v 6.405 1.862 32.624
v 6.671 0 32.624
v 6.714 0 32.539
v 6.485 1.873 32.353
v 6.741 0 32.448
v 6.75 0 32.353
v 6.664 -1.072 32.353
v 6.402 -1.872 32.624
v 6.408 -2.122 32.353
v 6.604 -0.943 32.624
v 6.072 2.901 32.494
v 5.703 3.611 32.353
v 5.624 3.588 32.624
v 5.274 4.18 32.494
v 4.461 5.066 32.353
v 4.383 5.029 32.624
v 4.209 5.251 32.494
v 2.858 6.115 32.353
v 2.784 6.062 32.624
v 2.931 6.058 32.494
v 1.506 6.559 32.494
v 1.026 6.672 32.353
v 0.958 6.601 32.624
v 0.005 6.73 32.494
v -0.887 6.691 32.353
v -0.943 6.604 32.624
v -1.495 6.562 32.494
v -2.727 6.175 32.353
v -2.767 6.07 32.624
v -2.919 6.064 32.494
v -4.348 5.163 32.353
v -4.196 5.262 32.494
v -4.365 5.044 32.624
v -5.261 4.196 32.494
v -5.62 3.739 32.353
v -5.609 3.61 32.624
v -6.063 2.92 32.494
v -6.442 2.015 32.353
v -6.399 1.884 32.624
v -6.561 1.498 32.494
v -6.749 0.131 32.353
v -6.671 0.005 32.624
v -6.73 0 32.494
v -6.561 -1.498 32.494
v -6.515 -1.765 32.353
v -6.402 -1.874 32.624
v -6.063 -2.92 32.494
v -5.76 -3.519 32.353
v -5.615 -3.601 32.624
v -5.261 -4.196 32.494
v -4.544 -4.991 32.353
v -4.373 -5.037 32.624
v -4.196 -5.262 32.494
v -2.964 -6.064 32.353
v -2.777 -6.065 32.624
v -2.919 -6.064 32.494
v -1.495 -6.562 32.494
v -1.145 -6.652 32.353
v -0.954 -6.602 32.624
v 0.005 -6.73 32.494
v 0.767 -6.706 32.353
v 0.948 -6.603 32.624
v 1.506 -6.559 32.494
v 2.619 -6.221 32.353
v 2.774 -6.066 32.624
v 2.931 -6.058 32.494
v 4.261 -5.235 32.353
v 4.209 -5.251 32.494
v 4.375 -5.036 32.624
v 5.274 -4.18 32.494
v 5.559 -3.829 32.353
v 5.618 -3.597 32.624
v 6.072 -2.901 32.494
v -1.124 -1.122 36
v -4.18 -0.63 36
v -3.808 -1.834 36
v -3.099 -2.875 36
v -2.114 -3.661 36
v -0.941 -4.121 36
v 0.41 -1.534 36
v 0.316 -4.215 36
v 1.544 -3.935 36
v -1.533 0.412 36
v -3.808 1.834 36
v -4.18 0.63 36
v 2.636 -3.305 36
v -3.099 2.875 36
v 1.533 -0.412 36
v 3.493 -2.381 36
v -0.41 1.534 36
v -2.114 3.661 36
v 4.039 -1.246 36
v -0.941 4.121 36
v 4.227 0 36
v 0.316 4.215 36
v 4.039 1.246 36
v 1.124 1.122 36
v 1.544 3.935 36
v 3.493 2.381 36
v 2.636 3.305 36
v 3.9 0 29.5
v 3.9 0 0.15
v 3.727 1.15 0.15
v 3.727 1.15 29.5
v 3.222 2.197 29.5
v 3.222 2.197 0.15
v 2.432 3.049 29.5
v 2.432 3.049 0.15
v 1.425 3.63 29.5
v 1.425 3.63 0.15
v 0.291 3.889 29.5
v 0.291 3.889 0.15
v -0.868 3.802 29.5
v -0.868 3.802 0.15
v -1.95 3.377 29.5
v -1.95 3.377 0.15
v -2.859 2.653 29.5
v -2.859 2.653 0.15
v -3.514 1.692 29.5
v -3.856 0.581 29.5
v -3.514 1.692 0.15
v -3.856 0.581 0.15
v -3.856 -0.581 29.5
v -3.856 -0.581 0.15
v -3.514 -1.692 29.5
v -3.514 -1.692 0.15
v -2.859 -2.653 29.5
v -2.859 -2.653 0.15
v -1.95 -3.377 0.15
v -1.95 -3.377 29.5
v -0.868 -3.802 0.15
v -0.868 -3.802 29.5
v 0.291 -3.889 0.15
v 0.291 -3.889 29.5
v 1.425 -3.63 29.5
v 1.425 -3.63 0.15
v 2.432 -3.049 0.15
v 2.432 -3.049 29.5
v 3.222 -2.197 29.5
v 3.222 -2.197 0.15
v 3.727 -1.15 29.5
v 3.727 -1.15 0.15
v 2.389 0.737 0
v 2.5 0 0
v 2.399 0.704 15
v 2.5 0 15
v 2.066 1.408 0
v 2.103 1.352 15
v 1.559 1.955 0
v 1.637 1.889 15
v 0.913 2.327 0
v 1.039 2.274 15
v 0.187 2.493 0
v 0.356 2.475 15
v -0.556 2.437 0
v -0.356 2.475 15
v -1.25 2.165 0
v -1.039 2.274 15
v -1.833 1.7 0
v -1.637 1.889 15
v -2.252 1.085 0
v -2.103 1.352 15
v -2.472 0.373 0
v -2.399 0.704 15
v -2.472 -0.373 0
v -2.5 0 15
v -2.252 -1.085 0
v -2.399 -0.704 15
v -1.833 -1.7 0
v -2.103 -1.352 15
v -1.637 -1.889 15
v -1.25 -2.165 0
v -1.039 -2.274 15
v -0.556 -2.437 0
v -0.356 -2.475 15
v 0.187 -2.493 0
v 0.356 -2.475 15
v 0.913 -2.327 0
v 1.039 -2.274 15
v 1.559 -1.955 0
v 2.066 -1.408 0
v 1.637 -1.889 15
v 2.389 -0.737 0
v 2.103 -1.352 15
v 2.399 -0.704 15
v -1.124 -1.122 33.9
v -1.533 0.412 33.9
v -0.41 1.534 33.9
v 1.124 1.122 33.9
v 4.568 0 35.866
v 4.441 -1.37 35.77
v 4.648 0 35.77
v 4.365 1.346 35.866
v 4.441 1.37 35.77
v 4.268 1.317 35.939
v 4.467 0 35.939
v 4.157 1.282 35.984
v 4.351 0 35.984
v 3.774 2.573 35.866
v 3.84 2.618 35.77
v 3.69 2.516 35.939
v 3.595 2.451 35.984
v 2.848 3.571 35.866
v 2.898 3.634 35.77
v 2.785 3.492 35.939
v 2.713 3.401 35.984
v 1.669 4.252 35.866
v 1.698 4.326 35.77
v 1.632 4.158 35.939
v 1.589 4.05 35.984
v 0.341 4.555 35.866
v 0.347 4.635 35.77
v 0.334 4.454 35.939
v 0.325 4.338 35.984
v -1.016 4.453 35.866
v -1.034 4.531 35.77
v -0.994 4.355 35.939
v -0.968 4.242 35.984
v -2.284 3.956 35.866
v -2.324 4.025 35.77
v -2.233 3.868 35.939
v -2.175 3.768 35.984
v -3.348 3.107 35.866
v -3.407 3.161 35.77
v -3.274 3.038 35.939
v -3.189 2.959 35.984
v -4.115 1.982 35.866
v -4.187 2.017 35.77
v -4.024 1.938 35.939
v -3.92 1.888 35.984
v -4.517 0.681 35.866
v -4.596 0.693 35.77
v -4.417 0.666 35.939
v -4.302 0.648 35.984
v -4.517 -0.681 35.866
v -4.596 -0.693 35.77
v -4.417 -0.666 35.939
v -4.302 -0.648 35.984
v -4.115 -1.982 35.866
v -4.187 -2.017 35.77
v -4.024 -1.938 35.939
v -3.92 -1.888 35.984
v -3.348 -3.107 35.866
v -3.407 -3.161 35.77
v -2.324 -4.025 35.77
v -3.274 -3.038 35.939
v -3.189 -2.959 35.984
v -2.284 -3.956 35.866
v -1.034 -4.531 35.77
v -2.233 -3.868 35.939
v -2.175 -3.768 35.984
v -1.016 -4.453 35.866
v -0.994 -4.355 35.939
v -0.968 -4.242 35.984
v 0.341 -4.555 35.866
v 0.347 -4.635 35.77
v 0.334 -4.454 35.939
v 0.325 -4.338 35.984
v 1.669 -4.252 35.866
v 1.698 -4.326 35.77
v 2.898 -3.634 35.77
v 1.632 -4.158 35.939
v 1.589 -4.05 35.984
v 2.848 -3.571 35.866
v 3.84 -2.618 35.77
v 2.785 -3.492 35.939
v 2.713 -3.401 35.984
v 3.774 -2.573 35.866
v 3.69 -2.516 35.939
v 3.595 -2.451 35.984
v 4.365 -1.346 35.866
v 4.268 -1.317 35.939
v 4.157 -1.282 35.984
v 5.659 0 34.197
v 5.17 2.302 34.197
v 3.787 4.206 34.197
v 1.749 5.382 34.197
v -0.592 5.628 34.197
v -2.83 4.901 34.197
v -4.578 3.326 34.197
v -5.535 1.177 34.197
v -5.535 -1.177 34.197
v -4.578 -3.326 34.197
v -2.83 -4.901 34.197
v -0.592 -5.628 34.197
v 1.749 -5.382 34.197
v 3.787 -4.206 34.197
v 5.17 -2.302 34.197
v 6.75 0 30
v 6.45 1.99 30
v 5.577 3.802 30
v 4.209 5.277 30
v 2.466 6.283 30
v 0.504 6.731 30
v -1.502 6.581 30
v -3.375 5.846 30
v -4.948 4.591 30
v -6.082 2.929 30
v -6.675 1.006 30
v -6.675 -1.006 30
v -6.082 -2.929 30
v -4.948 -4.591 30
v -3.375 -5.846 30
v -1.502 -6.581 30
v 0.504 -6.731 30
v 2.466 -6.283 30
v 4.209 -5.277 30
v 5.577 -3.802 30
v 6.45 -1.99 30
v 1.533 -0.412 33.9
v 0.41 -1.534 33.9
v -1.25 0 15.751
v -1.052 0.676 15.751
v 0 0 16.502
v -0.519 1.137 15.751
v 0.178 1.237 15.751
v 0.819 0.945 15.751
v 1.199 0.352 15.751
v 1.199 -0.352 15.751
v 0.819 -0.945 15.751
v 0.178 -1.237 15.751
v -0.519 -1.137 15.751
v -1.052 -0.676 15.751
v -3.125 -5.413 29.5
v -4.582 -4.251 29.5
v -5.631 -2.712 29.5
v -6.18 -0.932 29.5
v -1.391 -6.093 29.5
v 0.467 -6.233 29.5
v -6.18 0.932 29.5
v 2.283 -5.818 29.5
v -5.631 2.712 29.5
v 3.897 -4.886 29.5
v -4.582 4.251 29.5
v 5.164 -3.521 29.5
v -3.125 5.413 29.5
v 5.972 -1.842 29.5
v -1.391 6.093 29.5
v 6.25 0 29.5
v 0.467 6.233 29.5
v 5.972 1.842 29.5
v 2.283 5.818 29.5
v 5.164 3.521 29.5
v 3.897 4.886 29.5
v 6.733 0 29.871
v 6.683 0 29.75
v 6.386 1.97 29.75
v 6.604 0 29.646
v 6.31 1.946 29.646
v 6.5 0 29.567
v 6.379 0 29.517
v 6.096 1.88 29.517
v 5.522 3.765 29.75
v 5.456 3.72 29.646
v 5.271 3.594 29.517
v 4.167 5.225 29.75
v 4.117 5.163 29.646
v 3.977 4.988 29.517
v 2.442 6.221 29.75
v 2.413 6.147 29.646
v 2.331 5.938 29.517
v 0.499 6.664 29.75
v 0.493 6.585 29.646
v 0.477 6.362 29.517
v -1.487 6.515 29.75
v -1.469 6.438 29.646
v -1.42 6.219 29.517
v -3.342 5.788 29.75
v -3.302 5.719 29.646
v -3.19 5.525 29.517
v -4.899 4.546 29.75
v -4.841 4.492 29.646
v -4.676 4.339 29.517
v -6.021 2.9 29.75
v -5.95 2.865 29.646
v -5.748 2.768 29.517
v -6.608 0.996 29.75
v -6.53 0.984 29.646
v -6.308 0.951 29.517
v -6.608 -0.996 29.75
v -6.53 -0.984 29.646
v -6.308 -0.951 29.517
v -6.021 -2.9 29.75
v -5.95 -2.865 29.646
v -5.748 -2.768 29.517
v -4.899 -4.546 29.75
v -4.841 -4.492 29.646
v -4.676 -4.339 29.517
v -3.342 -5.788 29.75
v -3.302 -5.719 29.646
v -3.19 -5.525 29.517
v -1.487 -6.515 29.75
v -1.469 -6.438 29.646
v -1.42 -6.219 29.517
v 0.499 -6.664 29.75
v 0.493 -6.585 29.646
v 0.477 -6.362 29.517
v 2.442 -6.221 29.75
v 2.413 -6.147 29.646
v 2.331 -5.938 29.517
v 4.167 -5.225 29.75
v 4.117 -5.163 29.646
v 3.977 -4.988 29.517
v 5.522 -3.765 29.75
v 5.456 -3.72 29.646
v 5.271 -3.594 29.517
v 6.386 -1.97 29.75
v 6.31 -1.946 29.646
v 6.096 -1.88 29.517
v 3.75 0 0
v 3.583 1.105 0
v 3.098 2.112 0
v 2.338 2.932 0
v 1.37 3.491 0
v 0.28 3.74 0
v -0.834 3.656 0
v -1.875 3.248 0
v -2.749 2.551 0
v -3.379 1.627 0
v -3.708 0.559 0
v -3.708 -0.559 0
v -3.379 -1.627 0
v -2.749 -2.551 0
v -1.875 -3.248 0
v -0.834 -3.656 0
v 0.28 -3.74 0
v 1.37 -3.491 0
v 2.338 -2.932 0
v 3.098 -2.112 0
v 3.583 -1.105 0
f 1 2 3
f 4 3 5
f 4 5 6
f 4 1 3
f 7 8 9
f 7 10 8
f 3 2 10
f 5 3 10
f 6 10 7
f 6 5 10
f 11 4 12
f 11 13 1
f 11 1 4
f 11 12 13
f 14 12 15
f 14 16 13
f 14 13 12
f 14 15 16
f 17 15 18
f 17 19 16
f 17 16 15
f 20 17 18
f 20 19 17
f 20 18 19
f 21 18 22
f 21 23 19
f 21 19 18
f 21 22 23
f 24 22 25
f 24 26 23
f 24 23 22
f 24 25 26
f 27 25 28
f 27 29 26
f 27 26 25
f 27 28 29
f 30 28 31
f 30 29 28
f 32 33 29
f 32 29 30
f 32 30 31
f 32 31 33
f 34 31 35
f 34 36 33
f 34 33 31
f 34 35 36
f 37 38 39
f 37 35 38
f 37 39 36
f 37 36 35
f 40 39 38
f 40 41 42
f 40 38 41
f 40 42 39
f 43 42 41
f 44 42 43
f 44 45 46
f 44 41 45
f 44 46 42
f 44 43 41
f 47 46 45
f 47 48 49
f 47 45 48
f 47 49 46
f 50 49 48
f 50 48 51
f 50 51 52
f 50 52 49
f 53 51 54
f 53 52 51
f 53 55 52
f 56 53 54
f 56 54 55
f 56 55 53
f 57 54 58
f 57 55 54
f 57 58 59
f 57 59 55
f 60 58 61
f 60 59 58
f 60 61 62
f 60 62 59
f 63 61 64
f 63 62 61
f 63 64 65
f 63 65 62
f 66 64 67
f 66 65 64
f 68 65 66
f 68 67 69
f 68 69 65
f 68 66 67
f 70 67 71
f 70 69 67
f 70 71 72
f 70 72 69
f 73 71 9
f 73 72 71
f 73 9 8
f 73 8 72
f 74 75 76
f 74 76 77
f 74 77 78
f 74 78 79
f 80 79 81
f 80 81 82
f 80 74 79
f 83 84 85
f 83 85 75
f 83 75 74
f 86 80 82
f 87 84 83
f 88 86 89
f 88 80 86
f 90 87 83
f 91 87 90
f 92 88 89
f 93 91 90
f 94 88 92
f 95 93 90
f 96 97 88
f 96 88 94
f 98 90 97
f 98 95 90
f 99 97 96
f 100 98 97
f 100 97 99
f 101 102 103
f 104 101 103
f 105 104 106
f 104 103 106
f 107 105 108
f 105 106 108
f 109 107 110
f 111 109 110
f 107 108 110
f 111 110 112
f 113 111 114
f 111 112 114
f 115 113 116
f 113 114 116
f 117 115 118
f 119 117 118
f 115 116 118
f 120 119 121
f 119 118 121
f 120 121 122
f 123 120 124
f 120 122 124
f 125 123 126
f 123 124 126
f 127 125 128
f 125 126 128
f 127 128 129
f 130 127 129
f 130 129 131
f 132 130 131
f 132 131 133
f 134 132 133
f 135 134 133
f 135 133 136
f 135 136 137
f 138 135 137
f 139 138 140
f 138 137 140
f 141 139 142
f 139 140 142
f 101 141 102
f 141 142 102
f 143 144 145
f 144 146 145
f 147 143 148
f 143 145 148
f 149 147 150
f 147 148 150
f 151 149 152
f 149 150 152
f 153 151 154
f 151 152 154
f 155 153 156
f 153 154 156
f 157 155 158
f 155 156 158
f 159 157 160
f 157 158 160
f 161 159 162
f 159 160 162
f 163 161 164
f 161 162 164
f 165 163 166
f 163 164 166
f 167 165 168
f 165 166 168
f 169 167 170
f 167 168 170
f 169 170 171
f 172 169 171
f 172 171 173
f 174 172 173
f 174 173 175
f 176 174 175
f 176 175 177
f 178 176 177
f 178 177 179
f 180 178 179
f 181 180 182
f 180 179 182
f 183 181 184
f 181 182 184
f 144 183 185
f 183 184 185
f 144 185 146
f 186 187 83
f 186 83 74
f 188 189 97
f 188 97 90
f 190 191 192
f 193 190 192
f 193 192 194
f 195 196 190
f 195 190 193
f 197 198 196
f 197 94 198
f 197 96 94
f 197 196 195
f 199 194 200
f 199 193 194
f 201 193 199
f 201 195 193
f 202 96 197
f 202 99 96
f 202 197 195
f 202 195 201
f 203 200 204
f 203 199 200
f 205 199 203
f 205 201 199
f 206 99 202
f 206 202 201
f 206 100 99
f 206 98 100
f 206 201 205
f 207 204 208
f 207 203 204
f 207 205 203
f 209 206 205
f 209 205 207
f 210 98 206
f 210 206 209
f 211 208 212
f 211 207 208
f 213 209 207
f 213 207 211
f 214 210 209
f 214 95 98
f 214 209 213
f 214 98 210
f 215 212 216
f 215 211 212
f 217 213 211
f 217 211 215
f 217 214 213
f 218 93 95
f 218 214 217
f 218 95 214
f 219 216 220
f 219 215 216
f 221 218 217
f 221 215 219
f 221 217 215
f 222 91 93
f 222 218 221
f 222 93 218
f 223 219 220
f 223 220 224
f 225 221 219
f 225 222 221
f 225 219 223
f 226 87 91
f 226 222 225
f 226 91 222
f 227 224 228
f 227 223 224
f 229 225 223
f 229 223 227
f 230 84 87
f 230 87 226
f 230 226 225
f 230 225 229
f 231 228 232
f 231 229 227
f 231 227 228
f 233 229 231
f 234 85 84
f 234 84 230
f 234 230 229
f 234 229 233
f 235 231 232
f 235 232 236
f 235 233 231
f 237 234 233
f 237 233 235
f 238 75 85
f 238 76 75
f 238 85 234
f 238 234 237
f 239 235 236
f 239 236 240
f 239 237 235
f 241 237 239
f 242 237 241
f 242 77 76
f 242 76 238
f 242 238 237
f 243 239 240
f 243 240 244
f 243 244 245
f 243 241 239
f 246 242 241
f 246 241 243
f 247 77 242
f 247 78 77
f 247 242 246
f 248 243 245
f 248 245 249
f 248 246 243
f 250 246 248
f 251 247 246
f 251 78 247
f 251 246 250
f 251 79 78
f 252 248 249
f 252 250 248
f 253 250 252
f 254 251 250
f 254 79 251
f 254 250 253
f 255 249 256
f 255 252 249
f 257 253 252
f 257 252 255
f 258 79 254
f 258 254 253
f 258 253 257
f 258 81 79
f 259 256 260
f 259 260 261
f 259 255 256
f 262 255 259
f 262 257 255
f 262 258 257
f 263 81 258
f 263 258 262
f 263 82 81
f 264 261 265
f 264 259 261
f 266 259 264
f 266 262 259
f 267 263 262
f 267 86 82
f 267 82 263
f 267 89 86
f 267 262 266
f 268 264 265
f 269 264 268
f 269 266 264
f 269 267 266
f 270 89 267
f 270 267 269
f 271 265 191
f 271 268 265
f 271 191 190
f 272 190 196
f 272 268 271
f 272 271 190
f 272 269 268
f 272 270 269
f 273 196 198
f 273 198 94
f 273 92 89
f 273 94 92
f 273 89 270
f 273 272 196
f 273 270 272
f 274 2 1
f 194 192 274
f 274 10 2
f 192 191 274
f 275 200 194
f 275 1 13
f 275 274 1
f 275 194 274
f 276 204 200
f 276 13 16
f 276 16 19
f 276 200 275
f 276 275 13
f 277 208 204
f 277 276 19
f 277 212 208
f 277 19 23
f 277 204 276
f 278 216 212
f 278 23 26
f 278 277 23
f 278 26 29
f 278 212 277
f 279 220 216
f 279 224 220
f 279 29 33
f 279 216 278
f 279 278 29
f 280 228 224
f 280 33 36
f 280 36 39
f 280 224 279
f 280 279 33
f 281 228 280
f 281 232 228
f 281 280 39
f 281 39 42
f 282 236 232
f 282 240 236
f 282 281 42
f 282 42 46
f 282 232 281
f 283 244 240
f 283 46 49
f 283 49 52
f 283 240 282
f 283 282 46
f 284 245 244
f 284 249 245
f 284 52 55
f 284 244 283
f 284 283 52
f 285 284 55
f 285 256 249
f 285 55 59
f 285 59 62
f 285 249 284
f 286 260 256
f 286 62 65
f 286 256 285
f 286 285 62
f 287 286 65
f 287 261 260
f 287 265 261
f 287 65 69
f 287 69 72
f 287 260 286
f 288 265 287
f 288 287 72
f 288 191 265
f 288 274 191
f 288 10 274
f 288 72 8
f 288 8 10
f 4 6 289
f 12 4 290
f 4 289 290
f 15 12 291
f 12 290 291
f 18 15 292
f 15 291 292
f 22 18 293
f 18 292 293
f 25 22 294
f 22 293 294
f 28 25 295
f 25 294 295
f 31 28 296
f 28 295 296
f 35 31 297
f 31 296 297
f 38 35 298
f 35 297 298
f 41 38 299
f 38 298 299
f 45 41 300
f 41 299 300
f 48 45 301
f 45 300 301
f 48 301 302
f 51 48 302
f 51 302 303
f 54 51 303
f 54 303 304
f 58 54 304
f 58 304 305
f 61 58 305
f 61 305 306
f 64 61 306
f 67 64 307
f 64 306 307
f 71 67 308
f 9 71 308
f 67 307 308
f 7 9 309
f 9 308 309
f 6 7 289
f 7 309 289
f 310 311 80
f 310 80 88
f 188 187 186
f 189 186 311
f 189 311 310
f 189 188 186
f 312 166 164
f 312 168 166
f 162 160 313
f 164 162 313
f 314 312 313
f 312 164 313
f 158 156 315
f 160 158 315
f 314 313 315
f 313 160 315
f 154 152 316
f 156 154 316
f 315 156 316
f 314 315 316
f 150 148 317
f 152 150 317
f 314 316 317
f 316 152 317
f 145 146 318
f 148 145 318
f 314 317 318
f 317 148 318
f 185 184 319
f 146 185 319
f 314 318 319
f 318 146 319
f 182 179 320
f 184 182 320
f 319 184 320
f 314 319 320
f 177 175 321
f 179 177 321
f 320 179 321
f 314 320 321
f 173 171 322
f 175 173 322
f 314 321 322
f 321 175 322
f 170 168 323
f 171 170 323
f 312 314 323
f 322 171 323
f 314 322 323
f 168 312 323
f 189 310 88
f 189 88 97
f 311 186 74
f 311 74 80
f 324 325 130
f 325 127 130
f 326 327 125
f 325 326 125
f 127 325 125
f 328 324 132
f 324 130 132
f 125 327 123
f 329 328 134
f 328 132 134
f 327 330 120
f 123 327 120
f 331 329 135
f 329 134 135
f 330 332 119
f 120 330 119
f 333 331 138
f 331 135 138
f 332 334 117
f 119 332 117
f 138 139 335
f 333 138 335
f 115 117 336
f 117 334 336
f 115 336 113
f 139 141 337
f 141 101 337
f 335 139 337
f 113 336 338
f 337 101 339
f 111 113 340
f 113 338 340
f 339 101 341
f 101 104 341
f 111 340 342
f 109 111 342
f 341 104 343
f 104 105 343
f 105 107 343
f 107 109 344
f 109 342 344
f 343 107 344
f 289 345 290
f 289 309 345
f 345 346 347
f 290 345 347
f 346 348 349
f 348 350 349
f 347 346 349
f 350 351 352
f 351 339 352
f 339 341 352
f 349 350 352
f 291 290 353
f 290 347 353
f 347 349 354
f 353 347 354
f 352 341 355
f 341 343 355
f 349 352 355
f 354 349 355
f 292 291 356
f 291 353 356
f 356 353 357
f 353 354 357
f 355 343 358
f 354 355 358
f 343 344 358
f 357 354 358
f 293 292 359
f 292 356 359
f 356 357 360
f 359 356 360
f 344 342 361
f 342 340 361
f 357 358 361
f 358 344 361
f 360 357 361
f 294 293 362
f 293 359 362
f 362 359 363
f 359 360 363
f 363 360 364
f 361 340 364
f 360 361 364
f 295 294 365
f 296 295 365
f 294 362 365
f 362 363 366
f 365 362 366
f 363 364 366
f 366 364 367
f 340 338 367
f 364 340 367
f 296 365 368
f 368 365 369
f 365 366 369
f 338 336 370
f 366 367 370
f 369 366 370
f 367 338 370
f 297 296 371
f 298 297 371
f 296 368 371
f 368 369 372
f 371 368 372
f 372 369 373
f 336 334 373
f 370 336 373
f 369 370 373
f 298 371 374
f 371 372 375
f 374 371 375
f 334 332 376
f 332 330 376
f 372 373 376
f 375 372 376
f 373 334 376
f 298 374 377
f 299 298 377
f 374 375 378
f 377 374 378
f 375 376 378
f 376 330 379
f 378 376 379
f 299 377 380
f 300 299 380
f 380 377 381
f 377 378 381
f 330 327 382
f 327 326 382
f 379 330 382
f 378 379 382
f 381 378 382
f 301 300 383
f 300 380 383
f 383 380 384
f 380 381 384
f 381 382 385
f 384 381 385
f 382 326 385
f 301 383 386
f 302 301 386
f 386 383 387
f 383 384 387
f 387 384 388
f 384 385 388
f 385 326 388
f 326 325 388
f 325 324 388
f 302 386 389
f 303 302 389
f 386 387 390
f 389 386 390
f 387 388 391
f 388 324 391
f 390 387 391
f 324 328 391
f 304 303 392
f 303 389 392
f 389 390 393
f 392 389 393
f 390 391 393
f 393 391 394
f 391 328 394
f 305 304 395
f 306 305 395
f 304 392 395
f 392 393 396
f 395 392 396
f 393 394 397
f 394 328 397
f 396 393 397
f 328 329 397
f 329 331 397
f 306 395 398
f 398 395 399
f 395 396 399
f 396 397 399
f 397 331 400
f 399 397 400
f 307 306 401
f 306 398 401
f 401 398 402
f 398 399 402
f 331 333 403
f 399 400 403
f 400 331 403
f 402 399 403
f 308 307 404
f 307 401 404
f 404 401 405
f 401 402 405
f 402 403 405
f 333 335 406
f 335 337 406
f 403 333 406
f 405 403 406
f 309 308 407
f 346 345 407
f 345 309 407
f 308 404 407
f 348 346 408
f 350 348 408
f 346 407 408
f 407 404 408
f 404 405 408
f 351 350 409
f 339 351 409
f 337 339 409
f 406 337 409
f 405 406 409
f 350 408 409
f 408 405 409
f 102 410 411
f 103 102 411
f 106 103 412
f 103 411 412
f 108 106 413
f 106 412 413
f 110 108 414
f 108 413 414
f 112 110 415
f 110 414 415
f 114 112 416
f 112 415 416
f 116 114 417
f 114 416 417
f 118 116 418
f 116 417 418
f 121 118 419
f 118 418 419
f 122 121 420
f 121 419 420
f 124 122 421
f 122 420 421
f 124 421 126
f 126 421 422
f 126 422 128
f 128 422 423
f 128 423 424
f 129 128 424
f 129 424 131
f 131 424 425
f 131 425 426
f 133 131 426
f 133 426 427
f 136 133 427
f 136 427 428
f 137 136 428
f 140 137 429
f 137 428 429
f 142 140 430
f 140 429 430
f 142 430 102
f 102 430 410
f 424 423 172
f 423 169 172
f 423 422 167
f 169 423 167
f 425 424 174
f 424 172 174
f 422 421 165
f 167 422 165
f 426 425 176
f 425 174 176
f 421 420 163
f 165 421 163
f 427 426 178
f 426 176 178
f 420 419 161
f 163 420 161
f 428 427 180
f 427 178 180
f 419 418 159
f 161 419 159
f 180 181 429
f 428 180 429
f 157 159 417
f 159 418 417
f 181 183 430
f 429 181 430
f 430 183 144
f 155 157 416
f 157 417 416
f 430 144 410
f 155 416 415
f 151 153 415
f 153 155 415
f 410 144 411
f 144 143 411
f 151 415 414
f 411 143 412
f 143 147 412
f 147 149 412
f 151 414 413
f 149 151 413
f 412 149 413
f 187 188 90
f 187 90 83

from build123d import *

# Parameters (mm, degrees)
SKETCH1_R             = 3.9
BOSS_EXTRUDE1_DEPTH   = 29.5
SKETCH2_R             = 6.75
BOSS_EXTRUDE2_DEPTH   = 3
SKETCH3_R             = 4.5
FILLET1_R             = 0.5
CUT_EXTRUDE1_DEPTH    = 2.1
M6_TAPPED_HOLE1_D     = 5
M6_TAPPED_HOLE1_DEPTH = 15
M6_TAPPED_HOLE1_TIP   = 1.502151548
CHAMFER1_SIZE         = 0.15


with BuildPart() as part:
    # Sketch1 → Boss-Extrude1 (new body)
    with BuildSketch(Plane.XY):
        Circle(SKETCH1_R)
    extrude(amount=BOSS_EXTRUDE1_DEPTH)

    # Sketch2 → Boss-Extrude2 (add)
    with BuildSketch(Plane.XY.offset(29.5)):
        Circle(SKETCH2_R)
    extrude(amount=BOSS_EXTRUDE2_DEPTH)

    # Sketch3 → section 1 of loft1
    with BuildSketch(Plane.XY.offset(36), mode=Mode.PRIVATE) as loft1_s1:
        Circle(SKETCH3_R)
    # loft up to a face of the part (loft1)
    loft([Face(Wire([part.edges().sort_by_distance((-4.620692965, 4.920538235, 32.5))[0]])), loft1_s1.sketch])

    # Fillet1
    fillet1_edges = [part.edges().sort_by_distance(p)[0] for p in [
        (-6.75, 0, 29.5),
        (-6.75, 0, 32.5),
        (-4.5, 0, 36),
    ]]
    fillet(fillet1_edges, radius=FILLET1_R)

    # Sketch6 → Cut-Extrude1 (cut)
    with BuildSketch(Plane.XY.offset(36)):
        Polygon((1.533242561, -0.412311271), (1.123693315, 1.121671372), (-0.409549246, 1.533982643), (-1.533242561, 0.412311271), (-1.123693315, -1.121671372), (0.409549246, -1.533982643), align=None)
    extrude(amount=-CUT_EXTRUDE1_DEPTH, mode=Mode.SUBTRACT)

    # M6 Tapped Hole1
    with Locations(Plane(origin=(0, 0, 0), x_dir=(-1, 0, 0), z_dir=(0, 0, -1))):
        with Locations((0, 0)):
            Hole(M6_TAPPED_HOLE1_D / 2, depth=M6_TAPPED_HOLE1_DEPTH)
            with Locations((0, 0, -(M6_TAPPED_HOLE1_DEPTH + M6_TAPPED_HOLE1_TIP / 2))):  # 118° drill point
                Cone(0, M6_TAPPED_HOLE1_D / 2, M6_TAPPED_HOLE1_TIP, mode=Mode.SUBTRACT)

    # Chamfer1
    chamfer1_edges = [part.edges().sort_by_distance(p)[0] for p in [
        (-3.9, 0, 0),
    ]]
    chamfer(chamfer1_edges, length=CHAMFER1_SIZE)


solid = part.part
